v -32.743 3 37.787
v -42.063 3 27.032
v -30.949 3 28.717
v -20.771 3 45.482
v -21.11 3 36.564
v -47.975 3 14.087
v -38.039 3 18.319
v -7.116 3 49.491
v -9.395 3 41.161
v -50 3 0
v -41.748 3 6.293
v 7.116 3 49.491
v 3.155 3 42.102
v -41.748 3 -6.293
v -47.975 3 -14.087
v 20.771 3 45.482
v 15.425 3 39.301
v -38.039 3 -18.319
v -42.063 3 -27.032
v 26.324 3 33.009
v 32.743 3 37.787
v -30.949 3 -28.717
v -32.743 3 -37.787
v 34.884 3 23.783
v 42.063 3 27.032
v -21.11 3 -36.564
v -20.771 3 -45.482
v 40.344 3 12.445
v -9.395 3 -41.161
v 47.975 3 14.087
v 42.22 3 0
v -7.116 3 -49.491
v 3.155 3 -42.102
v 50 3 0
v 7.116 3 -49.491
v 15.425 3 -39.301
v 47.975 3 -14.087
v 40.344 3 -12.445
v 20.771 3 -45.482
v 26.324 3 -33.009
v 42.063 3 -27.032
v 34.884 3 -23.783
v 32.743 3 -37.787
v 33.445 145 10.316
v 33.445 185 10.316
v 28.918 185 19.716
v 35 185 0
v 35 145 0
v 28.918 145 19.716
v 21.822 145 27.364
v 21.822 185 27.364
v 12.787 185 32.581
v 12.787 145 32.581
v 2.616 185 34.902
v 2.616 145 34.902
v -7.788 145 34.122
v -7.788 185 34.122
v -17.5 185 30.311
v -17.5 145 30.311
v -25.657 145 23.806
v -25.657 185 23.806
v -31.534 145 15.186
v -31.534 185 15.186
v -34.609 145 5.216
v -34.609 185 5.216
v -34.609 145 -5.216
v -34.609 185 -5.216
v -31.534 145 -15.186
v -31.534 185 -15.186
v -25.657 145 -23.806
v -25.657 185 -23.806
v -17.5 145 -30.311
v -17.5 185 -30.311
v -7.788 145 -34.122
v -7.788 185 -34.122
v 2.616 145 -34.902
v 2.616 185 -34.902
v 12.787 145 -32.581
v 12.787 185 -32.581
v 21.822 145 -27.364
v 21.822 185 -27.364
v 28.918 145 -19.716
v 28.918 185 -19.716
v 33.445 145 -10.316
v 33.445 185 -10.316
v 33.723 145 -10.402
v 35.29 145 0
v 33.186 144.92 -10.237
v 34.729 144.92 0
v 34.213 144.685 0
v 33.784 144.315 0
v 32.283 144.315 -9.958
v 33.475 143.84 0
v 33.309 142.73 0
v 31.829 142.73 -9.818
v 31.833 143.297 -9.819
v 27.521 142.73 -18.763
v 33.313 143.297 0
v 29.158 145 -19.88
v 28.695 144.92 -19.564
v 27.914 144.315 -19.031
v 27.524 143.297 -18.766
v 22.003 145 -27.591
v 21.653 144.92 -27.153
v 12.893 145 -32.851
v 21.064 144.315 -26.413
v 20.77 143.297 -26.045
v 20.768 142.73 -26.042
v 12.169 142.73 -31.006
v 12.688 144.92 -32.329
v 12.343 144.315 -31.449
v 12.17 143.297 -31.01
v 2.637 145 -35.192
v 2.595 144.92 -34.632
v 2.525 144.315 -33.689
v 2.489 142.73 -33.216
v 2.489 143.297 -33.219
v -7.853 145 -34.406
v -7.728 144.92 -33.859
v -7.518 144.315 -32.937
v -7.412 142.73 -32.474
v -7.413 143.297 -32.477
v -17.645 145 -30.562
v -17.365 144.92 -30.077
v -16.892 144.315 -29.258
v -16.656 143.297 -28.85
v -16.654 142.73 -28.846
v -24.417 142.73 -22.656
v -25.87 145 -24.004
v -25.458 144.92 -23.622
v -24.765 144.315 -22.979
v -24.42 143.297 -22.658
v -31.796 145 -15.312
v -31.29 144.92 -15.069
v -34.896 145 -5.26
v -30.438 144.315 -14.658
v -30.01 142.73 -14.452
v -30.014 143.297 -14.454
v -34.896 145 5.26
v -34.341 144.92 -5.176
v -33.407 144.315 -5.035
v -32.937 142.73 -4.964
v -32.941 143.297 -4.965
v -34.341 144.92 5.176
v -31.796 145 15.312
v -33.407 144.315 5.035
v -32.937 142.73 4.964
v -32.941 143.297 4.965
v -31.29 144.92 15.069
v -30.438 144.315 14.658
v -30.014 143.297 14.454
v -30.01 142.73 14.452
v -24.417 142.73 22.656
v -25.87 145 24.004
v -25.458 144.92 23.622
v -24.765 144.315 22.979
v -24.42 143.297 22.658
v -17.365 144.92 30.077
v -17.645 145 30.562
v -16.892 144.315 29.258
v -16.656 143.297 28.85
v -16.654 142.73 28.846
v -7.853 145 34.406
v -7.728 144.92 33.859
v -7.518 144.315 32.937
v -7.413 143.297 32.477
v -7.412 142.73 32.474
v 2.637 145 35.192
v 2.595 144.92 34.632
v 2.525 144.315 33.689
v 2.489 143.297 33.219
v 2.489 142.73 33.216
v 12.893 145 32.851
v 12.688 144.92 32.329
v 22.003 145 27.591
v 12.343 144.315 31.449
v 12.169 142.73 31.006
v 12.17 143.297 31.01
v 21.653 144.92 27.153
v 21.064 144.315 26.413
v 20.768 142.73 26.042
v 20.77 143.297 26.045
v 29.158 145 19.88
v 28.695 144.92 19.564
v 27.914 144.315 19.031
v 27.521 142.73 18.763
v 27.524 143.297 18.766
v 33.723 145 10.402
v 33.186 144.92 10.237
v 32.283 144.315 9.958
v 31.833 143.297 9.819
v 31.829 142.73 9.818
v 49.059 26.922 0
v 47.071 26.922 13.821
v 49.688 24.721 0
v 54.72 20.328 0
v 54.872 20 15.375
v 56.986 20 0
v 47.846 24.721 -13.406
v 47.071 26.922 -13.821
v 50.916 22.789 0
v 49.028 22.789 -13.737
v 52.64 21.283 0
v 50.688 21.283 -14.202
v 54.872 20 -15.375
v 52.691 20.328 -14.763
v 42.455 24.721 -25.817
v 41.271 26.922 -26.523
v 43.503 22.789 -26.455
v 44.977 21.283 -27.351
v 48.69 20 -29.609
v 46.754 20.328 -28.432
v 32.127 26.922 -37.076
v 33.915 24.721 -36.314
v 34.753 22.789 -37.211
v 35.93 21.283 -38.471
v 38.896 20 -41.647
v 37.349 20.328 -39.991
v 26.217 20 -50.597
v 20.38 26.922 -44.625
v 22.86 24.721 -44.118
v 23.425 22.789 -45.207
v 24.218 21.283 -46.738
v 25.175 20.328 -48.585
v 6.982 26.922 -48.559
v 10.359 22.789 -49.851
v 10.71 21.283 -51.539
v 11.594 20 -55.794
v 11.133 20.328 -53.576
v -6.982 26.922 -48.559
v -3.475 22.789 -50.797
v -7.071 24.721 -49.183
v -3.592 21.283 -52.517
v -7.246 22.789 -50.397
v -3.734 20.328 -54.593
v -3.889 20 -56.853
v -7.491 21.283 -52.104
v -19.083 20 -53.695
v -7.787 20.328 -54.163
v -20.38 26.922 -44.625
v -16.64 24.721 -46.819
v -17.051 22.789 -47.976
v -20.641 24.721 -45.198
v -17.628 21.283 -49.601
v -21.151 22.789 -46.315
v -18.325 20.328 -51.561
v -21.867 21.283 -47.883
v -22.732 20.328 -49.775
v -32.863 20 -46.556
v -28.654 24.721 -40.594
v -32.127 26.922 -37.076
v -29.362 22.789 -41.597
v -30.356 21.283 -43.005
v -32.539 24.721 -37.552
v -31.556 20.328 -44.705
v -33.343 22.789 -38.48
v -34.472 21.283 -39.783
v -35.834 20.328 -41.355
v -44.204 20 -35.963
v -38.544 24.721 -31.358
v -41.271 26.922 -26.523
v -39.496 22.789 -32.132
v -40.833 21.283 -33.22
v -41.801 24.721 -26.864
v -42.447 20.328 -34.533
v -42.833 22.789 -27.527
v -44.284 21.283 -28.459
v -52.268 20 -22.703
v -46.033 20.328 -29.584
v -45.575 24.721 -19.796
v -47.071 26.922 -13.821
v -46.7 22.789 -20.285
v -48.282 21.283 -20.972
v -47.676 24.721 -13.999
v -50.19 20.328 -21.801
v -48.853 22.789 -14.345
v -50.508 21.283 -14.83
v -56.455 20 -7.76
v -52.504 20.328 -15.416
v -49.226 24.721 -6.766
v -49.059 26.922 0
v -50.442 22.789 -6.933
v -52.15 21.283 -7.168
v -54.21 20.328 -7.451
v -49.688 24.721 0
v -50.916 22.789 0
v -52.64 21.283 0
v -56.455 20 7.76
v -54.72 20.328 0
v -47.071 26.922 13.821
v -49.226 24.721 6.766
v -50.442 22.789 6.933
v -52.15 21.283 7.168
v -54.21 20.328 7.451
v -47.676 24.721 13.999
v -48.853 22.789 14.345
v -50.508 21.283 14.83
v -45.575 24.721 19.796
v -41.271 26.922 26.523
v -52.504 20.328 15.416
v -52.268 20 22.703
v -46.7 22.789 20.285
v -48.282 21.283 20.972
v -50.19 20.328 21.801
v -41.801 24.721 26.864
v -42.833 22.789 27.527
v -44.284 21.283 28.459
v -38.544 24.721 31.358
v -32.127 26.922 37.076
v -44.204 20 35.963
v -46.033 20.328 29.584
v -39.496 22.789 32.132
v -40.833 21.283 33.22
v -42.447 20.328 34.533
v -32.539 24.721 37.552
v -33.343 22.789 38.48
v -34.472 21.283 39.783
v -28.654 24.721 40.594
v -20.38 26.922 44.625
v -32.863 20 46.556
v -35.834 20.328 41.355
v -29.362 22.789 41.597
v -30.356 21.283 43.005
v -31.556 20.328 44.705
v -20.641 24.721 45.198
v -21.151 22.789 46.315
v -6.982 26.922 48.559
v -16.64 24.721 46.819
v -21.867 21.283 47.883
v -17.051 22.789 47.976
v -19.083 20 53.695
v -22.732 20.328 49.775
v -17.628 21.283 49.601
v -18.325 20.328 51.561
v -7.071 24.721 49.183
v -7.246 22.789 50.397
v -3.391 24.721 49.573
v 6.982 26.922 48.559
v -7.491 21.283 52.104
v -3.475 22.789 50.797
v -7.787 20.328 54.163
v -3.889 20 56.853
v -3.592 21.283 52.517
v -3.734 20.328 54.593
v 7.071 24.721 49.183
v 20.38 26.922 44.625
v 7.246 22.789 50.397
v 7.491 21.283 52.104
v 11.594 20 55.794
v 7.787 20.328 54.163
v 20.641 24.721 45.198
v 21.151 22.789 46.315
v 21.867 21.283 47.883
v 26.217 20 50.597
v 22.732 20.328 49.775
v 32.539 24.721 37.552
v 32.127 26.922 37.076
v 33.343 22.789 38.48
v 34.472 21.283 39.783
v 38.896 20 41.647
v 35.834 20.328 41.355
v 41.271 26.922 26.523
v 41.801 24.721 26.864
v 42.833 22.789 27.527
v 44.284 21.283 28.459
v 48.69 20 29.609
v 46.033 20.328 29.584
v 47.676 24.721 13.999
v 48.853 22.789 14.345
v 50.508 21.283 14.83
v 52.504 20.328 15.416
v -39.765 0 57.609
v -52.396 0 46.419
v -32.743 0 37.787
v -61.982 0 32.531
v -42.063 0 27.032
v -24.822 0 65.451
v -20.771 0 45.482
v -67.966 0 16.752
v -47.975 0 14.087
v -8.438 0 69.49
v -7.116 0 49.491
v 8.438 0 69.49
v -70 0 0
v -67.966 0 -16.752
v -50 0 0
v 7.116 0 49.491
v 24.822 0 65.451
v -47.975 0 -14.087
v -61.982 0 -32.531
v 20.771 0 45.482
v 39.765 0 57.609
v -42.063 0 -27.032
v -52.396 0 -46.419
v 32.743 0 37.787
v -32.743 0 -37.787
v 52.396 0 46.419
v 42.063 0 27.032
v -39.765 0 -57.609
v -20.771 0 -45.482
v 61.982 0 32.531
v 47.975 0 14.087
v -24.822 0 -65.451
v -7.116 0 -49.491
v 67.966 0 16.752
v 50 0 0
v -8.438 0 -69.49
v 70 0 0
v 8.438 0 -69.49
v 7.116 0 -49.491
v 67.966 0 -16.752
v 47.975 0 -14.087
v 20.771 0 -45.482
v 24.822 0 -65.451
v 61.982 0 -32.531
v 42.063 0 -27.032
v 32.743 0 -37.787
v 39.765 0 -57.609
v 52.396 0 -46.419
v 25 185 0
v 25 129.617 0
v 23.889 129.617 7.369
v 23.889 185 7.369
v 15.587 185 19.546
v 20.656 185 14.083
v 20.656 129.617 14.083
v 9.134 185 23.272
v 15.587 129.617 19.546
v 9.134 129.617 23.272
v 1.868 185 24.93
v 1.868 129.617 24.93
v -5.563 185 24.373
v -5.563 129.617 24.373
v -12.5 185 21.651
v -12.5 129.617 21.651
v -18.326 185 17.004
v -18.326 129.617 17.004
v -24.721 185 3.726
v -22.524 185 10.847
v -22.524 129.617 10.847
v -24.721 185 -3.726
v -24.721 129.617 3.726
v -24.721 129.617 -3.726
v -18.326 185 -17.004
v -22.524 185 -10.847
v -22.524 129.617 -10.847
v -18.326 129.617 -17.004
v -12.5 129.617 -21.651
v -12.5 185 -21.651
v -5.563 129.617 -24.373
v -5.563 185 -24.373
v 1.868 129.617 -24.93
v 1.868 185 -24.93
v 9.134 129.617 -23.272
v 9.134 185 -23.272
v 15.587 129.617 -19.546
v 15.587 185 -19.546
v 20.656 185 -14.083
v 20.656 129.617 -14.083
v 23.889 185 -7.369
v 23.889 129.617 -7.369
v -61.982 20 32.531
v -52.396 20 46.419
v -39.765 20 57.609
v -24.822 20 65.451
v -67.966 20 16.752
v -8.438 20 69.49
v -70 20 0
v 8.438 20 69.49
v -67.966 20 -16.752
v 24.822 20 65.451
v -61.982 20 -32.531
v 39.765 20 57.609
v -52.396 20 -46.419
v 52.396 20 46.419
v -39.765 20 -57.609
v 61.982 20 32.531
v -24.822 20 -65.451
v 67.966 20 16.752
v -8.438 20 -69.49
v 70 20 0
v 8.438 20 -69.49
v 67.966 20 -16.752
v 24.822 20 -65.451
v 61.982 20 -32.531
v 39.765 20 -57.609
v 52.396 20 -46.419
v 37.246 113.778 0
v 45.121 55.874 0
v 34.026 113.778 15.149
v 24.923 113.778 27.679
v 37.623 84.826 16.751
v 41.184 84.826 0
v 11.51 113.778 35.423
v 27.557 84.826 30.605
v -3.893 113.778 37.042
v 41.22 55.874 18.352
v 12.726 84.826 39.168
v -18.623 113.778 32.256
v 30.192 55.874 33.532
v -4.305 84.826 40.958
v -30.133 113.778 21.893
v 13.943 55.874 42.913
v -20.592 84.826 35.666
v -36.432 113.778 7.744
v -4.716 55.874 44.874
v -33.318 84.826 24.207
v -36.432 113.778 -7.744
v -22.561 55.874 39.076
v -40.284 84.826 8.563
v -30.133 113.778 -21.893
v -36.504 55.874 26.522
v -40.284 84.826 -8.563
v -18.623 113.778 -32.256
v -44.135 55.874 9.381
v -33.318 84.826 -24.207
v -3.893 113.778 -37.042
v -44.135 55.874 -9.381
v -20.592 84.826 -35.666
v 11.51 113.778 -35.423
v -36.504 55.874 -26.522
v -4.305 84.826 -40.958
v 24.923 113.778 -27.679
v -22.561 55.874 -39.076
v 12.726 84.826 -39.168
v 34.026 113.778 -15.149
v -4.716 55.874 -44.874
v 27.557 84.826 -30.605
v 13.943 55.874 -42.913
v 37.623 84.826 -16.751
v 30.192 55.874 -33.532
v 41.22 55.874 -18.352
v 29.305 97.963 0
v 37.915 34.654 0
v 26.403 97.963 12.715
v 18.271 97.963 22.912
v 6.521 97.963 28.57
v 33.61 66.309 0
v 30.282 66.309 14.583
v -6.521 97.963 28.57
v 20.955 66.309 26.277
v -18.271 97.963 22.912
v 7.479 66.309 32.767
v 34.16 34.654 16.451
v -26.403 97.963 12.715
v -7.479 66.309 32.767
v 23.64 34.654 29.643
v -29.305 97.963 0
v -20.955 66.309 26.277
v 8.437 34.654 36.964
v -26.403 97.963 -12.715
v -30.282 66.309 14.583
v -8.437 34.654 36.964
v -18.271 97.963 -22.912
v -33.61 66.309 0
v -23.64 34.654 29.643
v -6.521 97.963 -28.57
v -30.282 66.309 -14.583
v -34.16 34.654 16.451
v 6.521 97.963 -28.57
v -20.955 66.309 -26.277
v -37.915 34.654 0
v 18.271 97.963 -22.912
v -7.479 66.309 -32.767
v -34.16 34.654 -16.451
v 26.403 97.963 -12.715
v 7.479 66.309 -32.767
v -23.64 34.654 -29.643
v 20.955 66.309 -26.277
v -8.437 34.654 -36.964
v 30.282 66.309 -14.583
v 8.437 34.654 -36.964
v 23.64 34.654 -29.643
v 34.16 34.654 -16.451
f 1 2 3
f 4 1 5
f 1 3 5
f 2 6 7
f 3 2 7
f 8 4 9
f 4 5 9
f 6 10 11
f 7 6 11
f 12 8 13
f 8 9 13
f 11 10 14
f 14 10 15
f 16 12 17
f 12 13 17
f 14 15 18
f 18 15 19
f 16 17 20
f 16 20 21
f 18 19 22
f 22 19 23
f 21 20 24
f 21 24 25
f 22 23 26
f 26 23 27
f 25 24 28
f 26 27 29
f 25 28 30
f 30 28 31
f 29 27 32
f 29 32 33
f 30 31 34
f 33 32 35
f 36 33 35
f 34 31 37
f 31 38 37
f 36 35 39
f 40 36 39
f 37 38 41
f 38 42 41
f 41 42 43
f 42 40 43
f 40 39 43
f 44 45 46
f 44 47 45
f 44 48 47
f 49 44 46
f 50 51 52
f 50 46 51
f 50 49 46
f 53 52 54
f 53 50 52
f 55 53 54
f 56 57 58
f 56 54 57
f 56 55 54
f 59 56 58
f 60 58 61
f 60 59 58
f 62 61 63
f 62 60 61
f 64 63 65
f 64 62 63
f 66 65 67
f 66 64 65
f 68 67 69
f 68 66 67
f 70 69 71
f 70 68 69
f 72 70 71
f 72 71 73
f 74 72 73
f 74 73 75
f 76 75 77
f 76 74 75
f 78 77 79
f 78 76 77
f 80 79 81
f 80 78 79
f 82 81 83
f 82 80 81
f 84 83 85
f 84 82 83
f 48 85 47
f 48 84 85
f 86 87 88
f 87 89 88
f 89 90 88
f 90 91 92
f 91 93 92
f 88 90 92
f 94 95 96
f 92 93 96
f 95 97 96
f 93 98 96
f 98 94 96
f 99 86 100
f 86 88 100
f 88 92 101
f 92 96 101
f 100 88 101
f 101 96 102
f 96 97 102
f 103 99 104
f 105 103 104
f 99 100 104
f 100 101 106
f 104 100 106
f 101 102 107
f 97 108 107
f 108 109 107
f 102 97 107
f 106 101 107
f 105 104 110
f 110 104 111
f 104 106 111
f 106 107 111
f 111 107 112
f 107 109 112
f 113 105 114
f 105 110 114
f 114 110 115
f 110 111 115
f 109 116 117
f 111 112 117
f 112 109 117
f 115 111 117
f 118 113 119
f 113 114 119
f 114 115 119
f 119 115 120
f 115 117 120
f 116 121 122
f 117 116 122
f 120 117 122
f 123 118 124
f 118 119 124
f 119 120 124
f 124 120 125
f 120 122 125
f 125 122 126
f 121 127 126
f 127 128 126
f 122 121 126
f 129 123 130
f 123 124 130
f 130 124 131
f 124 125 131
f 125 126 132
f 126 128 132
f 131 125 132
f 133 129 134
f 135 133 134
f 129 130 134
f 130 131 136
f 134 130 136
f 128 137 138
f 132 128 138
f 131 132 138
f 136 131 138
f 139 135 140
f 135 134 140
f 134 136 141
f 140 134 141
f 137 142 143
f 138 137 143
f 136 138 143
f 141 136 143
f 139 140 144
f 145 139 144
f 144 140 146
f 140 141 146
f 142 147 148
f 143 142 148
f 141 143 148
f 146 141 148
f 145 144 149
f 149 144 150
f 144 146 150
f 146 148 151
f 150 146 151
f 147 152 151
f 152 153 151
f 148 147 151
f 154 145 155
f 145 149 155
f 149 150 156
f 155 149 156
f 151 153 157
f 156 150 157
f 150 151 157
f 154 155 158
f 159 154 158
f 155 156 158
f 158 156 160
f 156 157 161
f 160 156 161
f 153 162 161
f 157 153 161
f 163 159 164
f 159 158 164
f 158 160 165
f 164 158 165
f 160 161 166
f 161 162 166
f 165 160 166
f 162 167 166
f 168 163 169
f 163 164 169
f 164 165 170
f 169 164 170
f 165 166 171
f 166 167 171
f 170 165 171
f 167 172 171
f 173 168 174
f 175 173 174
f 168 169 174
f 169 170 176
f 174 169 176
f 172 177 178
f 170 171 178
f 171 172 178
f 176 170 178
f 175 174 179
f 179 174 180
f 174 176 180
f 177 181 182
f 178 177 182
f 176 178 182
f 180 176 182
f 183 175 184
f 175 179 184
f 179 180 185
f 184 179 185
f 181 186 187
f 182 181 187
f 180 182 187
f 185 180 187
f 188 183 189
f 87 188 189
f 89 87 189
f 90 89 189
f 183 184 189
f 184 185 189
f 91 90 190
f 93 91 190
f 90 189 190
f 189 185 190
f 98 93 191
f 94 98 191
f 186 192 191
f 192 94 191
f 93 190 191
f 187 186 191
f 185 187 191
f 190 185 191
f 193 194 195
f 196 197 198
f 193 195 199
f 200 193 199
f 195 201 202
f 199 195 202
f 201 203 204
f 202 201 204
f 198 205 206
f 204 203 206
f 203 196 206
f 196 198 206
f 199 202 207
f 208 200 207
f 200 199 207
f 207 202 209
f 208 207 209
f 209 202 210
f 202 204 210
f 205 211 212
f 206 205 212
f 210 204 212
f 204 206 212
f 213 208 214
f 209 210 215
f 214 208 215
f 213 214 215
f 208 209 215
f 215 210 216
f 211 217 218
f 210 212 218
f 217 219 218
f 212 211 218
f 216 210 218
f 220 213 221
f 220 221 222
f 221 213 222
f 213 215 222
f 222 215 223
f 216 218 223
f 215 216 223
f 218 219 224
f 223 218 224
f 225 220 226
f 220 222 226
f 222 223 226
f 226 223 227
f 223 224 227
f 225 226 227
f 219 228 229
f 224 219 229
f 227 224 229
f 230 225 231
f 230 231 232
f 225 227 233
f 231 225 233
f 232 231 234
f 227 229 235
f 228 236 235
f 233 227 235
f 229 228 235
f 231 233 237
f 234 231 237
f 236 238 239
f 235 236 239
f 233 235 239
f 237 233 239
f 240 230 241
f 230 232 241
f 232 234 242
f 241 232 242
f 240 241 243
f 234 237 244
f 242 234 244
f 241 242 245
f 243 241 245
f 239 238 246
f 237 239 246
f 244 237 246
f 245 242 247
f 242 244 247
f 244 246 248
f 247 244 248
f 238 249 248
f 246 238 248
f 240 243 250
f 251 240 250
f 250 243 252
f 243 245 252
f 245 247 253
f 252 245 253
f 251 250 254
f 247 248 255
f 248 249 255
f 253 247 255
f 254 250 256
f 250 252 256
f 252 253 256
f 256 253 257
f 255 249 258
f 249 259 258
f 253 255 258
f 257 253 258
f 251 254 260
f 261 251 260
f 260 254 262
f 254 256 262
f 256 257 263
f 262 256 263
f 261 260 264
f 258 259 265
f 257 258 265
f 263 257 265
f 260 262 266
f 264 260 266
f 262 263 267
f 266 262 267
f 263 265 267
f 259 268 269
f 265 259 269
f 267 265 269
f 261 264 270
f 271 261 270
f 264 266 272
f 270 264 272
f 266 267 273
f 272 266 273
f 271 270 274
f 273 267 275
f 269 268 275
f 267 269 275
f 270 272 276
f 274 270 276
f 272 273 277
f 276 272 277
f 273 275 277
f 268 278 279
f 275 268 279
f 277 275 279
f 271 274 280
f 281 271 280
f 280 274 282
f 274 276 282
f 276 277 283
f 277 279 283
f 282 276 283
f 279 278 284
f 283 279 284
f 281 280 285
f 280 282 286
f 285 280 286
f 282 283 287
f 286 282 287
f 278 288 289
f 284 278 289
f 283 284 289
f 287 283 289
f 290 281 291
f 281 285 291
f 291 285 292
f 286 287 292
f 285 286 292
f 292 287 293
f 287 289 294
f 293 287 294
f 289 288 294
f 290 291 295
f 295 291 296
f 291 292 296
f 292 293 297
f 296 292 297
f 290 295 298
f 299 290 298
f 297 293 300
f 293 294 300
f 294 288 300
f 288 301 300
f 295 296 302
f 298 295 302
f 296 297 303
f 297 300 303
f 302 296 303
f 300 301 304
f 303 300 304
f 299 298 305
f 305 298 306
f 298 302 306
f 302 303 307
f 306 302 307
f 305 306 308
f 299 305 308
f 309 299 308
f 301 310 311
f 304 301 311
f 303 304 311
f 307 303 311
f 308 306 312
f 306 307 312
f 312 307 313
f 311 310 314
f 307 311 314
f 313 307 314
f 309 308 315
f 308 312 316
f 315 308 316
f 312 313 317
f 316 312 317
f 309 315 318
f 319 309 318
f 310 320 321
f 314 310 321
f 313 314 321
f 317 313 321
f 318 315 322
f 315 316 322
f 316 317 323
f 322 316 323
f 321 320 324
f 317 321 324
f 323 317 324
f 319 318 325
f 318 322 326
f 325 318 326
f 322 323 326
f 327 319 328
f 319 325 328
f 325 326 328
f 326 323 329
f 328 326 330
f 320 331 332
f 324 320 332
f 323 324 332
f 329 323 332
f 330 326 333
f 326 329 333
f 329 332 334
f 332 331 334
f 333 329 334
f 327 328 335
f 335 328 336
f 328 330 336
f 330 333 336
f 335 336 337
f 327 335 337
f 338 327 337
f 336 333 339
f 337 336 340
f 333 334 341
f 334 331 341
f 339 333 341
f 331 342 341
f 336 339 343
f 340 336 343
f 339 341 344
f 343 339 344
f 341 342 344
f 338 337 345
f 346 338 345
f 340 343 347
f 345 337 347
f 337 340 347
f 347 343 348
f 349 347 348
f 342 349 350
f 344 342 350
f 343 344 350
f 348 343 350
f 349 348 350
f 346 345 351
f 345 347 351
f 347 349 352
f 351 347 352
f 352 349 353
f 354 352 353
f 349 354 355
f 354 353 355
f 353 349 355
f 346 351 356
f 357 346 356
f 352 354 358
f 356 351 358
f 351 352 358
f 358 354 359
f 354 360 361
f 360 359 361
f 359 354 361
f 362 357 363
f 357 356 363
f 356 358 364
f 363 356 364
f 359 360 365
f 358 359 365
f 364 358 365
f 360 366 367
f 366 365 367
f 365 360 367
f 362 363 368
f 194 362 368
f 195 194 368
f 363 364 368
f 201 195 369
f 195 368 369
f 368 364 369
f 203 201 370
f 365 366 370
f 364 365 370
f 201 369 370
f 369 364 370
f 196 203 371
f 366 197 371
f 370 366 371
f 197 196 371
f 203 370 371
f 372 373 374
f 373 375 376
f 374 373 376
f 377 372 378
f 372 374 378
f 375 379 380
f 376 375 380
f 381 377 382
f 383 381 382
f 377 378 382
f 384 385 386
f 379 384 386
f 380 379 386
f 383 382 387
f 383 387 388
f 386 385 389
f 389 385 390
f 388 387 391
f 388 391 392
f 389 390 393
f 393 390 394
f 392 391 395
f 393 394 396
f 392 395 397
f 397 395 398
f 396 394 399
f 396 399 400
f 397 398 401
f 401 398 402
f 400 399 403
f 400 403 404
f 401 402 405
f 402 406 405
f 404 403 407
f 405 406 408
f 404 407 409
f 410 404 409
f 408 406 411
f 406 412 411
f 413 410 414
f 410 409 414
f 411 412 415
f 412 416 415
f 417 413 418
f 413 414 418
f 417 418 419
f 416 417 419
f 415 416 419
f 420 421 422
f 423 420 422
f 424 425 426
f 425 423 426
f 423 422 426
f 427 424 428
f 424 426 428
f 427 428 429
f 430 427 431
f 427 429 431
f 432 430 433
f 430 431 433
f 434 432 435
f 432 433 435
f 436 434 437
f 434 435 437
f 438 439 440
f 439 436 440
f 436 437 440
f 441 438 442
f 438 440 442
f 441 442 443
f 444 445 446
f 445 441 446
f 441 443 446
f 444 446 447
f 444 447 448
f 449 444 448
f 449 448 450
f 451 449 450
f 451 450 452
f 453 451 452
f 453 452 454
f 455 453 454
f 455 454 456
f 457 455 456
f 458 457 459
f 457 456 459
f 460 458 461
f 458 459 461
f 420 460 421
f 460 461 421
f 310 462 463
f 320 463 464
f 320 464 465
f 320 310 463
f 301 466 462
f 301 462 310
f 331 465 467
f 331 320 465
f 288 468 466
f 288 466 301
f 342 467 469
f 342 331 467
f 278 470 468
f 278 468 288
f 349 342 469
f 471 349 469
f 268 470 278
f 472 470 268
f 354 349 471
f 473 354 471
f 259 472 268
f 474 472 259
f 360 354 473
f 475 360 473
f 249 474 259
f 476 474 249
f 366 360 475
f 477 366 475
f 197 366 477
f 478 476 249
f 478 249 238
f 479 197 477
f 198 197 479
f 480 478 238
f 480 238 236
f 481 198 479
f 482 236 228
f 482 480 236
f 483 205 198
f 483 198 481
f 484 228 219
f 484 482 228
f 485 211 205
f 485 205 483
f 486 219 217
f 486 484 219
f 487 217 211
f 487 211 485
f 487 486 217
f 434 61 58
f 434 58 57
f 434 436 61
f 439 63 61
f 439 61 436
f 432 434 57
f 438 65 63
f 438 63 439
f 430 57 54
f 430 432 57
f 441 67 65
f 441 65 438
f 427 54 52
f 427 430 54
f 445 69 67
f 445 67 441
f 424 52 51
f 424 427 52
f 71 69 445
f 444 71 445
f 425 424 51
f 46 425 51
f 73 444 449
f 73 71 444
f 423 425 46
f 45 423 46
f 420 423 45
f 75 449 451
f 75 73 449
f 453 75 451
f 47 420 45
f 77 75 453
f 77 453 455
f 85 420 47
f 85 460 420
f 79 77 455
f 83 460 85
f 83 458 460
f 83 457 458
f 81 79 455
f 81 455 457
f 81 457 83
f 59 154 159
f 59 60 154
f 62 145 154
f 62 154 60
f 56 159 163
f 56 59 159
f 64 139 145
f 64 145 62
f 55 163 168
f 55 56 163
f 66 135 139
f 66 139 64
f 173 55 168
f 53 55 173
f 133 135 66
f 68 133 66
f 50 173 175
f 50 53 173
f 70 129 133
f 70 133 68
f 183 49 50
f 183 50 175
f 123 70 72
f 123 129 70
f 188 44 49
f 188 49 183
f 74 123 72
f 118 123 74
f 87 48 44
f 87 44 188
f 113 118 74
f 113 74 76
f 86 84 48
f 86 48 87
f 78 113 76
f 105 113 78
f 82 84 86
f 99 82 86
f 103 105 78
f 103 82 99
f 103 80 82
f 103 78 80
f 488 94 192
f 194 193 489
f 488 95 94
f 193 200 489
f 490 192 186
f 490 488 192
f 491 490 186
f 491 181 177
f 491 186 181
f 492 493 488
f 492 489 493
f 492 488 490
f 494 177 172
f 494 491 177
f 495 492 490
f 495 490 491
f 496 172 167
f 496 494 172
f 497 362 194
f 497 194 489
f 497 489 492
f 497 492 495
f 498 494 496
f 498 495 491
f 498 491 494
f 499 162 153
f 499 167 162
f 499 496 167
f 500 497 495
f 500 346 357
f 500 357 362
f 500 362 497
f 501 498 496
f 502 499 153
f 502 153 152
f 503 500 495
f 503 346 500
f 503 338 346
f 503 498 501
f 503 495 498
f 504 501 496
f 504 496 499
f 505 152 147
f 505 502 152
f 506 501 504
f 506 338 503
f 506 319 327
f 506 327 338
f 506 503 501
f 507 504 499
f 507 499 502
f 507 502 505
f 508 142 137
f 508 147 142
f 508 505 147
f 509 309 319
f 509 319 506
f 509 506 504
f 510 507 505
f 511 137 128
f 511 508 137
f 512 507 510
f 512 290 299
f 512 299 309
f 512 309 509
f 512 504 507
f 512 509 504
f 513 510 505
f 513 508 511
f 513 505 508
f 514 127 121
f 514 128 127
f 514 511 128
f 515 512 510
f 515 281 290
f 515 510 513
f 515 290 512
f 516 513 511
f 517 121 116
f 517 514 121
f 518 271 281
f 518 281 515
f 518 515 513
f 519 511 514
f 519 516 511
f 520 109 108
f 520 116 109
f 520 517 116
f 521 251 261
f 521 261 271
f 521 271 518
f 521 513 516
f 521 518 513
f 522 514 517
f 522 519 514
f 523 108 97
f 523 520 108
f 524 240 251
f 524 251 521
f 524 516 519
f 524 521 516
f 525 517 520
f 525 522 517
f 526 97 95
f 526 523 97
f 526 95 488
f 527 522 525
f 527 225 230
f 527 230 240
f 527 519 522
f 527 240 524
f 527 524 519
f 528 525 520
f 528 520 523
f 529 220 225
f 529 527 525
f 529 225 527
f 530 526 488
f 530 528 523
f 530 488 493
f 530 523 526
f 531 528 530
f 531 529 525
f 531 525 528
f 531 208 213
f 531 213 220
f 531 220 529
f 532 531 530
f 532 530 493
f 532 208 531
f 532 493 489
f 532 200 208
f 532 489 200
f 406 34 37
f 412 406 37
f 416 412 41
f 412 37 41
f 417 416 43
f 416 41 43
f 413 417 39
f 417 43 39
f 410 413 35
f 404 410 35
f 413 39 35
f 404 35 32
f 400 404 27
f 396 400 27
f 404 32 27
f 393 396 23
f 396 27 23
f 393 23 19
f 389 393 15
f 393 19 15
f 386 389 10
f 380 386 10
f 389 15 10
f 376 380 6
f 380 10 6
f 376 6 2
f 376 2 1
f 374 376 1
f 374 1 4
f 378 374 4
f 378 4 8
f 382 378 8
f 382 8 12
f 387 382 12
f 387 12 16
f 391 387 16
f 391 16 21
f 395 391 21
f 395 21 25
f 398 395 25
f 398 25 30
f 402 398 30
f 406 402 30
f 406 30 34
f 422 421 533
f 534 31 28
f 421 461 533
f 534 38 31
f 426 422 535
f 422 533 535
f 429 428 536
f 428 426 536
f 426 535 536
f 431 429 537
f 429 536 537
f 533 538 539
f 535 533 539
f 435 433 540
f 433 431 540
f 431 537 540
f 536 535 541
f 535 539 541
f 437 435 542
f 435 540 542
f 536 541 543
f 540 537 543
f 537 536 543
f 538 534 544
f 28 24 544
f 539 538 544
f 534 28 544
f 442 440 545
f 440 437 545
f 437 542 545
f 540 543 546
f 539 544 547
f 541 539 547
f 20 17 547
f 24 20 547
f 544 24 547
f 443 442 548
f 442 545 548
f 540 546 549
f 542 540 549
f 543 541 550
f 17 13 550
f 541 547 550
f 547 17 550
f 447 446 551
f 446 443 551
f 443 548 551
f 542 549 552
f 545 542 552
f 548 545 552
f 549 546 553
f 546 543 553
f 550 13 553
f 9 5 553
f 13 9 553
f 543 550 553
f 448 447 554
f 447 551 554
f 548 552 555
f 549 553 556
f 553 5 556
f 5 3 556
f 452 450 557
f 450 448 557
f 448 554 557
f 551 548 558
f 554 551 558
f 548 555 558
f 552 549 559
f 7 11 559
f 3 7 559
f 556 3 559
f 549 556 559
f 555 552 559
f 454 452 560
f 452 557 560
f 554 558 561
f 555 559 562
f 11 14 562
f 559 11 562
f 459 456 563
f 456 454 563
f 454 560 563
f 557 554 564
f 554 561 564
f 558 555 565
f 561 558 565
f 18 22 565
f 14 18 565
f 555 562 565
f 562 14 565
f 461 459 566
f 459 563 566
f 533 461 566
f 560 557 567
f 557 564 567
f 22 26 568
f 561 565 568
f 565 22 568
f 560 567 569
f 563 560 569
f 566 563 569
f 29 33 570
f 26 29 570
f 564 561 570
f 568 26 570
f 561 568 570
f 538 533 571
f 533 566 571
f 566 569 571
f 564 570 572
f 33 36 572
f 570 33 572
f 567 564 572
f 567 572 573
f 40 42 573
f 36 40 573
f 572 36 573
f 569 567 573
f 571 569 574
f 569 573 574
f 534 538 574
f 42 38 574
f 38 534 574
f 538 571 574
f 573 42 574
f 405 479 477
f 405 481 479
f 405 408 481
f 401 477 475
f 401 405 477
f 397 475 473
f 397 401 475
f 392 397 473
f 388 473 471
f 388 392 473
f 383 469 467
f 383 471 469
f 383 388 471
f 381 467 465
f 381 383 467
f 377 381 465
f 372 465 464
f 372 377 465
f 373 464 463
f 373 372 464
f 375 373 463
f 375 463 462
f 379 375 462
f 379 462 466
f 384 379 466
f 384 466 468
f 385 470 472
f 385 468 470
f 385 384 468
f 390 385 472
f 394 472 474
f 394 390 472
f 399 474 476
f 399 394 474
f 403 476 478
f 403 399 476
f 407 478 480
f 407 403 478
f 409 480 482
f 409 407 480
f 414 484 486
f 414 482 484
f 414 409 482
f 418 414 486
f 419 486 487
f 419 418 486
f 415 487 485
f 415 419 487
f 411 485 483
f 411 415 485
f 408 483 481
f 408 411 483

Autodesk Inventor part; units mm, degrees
ref_plane "YZ Plane" through (0, 0, 0) normal (1, 0, 0) x (0, 1, 0)
ref_plane "XZ Plane" through (0, 0, 0) normal (0, 1, 0) x (-1, 0, 0)
ref_plane "XY Plane" through (0, 0, 0) normal (0, 0, 1) x (1, 0, 0)
sketch "FV.sec" plane through (0, 0, 0) normal (0, 0, 1) x (1, 0, 0)
  line L0 (25, 185) -> (35, 185)
  line L1 (35, 185) -> (35, 145)
  line L2 (25, 185) -> (25, 129.6172)
  line L3 (50, 20) -> (70, 20)
  line L4 (70, 20) -> (70, 0)
  line L5 (0, 0) -> (0, 185)
  line L6 (35, 145) -> (35.2904, 145)
  line L7 (33.3087, 142.7305) -> (50, 20)
  line L8 (70, 0) -> (50, 0)
  line L9 (50, 0) -> (50, 3)
  line L10 (50, 3) -> (42.2199, 3)
  line L11 (42.2199, 3) -> (25, 129.6172)
  arc A0 (35.2904, 145) -> (33.3087, 142.7305) centre (35.2904, 143) ccw
  point P0 (33, 145)
  dimension "d9" = 40
  dimension "d11" = 185
  dimension "d12" = 20
  dimension "d16" = 3
  dimension "d17" = 10
  dimension "d18" = 66
  dimension "d21" = 100
  dimension "d22" = 10
  dimension "d23" = 100
  dimension "d24" = 20
  dimension "d28" = 2
revolve "Revolution1" add sketch "FV.sec" angle 360 about axis through (0, 0, 0) along (0, 1, 0)
fillet "Fillet1" radius 8 1 edges at (-50, 20, 0)
properties material "Iron, Cast"
